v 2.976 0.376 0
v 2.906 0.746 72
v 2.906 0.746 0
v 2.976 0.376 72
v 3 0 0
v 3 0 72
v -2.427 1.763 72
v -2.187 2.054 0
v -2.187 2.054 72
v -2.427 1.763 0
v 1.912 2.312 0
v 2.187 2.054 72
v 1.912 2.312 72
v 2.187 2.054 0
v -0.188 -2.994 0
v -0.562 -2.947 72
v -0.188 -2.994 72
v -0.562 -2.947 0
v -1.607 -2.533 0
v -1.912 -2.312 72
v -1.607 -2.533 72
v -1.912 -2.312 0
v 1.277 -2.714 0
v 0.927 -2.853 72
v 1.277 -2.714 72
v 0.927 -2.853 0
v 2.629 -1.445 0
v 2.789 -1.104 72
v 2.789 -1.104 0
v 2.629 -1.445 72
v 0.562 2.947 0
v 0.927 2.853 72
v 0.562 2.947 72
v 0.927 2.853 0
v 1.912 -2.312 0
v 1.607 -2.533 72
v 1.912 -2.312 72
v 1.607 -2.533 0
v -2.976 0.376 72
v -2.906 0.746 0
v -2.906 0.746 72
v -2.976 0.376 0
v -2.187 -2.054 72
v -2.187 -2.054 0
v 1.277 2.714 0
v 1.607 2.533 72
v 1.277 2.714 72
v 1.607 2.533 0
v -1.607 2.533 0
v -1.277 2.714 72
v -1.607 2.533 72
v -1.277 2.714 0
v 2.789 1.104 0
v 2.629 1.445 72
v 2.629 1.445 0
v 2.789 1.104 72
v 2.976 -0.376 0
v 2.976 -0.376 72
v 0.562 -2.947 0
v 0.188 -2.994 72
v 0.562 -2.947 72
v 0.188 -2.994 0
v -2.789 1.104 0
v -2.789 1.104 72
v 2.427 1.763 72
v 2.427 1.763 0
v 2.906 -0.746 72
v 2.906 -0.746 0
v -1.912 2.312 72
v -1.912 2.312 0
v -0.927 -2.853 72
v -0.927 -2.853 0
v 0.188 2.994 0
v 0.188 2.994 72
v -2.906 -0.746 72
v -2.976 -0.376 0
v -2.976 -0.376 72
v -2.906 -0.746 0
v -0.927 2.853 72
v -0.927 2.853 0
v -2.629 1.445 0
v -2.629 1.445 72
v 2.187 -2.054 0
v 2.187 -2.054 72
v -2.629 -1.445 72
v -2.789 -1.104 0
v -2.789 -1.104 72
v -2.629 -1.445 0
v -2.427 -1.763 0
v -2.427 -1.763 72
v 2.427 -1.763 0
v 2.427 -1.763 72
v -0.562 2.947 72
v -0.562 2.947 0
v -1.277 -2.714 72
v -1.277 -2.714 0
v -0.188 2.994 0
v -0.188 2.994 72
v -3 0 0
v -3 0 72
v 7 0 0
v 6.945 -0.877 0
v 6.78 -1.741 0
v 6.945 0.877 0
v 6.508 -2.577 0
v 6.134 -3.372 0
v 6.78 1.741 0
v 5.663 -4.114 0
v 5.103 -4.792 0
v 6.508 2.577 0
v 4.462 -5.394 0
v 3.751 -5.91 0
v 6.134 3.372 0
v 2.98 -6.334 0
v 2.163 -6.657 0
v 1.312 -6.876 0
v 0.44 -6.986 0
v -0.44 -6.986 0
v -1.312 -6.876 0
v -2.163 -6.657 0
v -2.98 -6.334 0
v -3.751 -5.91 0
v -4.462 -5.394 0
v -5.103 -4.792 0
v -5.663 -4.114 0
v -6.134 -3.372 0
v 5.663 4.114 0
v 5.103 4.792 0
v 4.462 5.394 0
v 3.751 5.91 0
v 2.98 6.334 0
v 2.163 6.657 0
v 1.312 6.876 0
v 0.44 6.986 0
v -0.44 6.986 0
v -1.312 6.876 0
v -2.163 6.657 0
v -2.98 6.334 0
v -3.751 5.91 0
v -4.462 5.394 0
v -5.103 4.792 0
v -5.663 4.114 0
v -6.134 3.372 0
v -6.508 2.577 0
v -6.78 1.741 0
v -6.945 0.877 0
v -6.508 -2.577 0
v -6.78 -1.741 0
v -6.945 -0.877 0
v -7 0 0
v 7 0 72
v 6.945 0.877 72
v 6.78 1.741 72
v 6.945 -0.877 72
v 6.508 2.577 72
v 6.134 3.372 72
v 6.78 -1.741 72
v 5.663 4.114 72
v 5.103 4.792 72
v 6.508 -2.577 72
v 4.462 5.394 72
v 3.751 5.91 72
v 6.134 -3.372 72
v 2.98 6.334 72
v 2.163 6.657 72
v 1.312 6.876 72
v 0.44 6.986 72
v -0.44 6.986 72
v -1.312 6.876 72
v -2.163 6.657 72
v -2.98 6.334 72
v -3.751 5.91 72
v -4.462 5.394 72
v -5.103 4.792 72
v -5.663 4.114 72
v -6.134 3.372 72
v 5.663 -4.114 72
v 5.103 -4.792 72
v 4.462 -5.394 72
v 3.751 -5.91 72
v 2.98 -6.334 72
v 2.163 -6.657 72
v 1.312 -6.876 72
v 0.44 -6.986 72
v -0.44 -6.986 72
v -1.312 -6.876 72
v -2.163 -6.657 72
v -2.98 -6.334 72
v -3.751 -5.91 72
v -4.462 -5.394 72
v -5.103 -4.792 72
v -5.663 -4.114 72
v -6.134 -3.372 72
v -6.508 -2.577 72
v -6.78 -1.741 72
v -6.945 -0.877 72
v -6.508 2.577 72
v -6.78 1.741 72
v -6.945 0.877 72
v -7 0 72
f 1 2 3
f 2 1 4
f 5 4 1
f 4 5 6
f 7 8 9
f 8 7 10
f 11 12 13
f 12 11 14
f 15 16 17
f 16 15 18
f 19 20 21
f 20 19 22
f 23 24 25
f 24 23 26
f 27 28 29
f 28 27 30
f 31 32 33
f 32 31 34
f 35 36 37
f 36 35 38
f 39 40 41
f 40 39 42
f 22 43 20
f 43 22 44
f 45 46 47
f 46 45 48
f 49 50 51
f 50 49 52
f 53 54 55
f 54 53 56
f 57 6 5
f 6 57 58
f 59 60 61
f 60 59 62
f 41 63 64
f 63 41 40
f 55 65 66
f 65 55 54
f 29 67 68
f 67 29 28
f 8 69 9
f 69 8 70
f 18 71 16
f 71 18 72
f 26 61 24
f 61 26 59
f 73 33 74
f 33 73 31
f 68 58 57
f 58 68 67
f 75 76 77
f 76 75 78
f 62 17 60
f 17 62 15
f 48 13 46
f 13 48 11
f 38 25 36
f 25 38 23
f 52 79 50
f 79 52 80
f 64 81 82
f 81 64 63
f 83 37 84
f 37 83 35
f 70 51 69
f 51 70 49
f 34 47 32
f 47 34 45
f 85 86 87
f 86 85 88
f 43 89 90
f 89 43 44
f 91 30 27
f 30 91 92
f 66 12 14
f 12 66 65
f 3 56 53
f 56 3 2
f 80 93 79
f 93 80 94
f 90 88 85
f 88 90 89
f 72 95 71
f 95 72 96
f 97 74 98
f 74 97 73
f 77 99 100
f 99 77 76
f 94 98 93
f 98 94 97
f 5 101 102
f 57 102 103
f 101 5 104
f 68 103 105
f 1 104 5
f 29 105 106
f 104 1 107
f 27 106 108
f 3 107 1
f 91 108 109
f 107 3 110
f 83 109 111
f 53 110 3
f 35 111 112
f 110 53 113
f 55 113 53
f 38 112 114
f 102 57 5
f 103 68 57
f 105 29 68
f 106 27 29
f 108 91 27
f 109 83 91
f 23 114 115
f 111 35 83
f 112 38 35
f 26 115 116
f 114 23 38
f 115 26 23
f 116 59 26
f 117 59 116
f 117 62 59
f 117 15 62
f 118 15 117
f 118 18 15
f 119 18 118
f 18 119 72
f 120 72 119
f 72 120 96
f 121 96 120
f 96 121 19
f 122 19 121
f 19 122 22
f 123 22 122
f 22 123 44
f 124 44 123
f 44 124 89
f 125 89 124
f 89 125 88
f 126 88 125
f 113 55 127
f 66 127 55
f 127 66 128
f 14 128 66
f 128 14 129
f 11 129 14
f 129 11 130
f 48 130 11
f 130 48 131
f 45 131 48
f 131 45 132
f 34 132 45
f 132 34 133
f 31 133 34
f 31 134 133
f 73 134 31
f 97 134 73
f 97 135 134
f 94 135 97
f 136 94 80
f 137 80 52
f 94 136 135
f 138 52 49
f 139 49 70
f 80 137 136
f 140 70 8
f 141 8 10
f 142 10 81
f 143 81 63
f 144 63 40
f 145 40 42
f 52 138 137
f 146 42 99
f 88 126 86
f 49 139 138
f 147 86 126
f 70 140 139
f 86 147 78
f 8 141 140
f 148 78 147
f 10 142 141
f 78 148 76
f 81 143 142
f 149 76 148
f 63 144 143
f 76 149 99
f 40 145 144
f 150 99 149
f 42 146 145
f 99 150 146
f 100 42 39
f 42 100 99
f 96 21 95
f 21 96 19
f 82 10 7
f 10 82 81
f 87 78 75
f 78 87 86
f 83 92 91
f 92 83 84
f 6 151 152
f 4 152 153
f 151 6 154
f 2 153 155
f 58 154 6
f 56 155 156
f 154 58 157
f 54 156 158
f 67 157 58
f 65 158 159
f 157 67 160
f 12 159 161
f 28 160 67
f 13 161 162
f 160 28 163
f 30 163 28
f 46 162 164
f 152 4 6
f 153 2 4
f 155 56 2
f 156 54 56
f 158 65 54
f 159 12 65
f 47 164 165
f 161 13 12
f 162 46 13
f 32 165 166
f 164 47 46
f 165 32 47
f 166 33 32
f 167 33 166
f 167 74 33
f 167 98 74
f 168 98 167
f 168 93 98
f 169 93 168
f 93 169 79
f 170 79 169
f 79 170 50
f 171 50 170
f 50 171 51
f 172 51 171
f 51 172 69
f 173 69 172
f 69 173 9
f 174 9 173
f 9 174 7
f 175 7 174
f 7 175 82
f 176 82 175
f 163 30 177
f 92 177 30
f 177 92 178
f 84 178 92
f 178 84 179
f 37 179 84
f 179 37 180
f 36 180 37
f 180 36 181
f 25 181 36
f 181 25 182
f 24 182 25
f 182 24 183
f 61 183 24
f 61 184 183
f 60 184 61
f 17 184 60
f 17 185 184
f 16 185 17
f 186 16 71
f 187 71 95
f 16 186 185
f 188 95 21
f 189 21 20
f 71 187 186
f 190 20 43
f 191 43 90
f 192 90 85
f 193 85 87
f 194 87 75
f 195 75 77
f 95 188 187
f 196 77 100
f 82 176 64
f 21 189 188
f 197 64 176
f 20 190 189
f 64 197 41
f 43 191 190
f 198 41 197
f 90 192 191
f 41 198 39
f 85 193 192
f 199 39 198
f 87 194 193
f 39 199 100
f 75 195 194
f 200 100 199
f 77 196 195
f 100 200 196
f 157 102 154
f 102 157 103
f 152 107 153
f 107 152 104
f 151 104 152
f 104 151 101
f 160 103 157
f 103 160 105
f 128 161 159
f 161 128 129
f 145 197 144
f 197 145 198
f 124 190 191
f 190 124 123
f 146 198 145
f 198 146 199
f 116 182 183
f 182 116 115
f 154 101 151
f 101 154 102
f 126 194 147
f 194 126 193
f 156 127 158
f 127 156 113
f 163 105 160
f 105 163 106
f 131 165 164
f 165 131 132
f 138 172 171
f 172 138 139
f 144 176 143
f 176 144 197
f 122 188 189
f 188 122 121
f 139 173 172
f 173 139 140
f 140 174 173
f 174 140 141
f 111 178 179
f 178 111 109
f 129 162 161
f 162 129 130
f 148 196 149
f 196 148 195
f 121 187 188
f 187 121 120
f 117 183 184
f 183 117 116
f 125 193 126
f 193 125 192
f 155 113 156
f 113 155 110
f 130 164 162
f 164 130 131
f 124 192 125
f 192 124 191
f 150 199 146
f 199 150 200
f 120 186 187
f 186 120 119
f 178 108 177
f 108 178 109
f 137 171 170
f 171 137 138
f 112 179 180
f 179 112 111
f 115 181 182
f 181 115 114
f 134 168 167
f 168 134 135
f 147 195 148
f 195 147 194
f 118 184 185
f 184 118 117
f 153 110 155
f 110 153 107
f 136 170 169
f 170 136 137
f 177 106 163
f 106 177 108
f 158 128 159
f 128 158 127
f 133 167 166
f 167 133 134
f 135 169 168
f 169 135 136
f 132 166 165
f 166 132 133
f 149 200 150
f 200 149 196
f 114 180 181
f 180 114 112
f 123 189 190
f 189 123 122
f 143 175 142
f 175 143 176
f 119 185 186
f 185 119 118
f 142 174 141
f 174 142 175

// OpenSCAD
$fn = 50;


difference() {
	union() {
		cylinder(h = 72, r = 7.0000000000);
	}
	union() {
		cylinder(h = 72, r = 3.0000000000);
		cylinder(h = 72, r = 1.5000000000);
		cylinder(h = 72, r = 1.5000000000);
		cylinder(h = 72, r = 1.5000000000);
	}
}
